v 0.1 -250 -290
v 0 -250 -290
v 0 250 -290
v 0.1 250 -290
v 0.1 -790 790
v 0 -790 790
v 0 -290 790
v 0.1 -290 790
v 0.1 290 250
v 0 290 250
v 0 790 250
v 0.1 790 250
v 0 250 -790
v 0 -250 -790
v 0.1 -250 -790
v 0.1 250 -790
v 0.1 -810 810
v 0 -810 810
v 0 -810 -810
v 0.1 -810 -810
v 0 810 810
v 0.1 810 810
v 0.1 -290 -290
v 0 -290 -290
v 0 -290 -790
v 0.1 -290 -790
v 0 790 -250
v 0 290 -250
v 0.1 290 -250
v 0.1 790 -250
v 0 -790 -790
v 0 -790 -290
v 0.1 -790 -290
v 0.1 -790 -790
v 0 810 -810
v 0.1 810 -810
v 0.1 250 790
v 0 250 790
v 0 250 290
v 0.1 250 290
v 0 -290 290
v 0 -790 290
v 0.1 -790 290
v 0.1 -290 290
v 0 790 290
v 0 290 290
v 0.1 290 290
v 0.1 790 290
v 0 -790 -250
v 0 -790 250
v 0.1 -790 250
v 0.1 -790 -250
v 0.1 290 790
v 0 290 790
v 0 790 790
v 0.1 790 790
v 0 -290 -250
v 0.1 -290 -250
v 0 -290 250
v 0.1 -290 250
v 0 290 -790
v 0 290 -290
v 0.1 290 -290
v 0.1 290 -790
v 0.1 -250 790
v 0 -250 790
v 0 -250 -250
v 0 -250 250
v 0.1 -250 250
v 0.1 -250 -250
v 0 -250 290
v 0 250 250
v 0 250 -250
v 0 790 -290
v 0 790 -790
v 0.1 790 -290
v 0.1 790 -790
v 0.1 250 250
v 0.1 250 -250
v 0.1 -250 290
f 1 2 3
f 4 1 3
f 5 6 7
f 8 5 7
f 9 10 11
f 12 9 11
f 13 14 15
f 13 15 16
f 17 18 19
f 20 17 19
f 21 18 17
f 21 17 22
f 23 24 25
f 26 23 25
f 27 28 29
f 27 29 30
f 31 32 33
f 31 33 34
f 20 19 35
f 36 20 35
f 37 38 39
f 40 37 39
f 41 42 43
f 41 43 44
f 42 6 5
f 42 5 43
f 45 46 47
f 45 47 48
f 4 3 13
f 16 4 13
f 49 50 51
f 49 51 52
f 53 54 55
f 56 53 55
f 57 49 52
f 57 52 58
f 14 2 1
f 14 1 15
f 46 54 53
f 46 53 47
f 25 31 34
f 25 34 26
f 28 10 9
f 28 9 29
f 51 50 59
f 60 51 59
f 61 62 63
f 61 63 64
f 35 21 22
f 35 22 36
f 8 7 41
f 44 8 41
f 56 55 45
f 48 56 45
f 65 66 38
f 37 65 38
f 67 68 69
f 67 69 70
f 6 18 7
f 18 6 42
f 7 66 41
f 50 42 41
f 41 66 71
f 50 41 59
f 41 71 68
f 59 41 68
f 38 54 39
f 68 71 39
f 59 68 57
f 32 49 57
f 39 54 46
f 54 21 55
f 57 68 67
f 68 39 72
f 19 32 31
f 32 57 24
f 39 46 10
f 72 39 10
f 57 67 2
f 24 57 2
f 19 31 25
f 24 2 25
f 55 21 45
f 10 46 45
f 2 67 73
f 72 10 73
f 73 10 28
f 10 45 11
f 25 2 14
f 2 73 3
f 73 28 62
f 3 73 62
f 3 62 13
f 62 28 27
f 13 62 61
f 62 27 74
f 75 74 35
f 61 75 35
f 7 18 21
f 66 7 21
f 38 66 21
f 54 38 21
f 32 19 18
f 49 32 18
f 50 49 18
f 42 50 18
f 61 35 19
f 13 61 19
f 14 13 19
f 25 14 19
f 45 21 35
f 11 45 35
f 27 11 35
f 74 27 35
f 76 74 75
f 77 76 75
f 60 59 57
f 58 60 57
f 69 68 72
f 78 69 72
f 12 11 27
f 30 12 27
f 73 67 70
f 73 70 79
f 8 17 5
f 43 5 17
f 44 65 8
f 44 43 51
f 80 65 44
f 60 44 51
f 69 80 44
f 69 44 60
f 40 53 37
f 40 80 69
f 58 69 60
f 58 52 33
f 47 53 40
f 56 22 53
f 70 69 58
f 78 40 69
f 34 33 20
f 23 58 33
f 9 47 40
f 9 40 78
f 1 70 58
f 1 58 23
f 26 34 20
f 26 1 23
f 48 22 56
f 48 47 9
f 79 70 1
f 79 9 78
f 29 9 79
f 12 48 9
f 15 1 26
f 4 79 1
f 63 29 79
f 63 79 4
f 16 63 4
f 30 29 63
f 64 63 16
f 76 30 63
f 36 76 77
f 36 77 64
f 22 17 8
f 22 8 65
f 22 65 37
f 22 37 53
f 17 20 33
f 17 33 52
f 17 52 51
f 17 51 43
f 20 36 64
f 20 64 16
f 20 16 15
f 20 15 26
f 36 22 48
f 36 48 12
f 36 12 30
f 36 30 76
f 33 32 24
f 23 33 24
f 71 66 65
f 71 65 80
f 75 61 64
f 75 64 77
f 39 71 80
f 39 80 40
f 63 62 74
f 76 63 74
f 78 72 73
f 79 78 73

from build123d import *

# Parameters (mm, degrees)
SKETCH_1_W      = 1620
SKETCH_1_H      = 1620
SKETCH_1_W_2    = 500
SKETCH_1_H_2    = 500
EXTRUDE_1_DEPTH = 0.1


with BuildPart() as part:
    # 草图1 → 凸台-拉伸1 (new body)
    with BuildSketch(Plane(origin=(0, 0, 0), x_dir=(0, 0, -1), z_dir=(1, 0, 0))):
        Rectangle(SKETCH_1_W, SKETCH_1_H)
        with Locations((-540, 540)):
            Rectangle(SKETCH_1_W_2, SKETCH_1_H_2, mode=Mode.SUBTRACT)
        with Locations((0, 540)):
            Rectangle(SKETCH_1_W_2, SKETCH_1_H_2, mode=Mode.SUBTRACT)
        with Locations((540, 540)):
            Rectangle(SKETCH_1_W_2, SKETCH_1_H_2, mode=Mode.SUBTRACT)
        with Locations((540, 0)):
            Rectangle(SKETCH_1_W_2, SKETCH_1_H_2, mode=Mode.SUBTRACT)
        Rectangle(SKETCH_1_W_2, SKETCH_1_H_2, mode=Mode.SUBTRACT)
        with Locations((-540, 0)):
            Rectangle(SKETCH_1_W_2, SKETCH_1_H_2, mode=Mode.SUBTRACT)
        with Locations((-540, -540)):
            Rectangle(SKETCH_1_W_2, SKETCH_1_H_2, mode=Mode.SUBTRACT)
        with Locations((0, -540)):
            Rectangle(SKETCH_1_W_2, SKETCH_1_H_2, mode=Mode.SUBTRACT)
        with Locations((540, -540)):
            Rectangle(SKETCH_1_W_2, SKETCH_1_H_2, mode=Mode.SUBTRACT)
    extrude(amount=EXTRUDE_1_DEPTH)


solid = part.part
